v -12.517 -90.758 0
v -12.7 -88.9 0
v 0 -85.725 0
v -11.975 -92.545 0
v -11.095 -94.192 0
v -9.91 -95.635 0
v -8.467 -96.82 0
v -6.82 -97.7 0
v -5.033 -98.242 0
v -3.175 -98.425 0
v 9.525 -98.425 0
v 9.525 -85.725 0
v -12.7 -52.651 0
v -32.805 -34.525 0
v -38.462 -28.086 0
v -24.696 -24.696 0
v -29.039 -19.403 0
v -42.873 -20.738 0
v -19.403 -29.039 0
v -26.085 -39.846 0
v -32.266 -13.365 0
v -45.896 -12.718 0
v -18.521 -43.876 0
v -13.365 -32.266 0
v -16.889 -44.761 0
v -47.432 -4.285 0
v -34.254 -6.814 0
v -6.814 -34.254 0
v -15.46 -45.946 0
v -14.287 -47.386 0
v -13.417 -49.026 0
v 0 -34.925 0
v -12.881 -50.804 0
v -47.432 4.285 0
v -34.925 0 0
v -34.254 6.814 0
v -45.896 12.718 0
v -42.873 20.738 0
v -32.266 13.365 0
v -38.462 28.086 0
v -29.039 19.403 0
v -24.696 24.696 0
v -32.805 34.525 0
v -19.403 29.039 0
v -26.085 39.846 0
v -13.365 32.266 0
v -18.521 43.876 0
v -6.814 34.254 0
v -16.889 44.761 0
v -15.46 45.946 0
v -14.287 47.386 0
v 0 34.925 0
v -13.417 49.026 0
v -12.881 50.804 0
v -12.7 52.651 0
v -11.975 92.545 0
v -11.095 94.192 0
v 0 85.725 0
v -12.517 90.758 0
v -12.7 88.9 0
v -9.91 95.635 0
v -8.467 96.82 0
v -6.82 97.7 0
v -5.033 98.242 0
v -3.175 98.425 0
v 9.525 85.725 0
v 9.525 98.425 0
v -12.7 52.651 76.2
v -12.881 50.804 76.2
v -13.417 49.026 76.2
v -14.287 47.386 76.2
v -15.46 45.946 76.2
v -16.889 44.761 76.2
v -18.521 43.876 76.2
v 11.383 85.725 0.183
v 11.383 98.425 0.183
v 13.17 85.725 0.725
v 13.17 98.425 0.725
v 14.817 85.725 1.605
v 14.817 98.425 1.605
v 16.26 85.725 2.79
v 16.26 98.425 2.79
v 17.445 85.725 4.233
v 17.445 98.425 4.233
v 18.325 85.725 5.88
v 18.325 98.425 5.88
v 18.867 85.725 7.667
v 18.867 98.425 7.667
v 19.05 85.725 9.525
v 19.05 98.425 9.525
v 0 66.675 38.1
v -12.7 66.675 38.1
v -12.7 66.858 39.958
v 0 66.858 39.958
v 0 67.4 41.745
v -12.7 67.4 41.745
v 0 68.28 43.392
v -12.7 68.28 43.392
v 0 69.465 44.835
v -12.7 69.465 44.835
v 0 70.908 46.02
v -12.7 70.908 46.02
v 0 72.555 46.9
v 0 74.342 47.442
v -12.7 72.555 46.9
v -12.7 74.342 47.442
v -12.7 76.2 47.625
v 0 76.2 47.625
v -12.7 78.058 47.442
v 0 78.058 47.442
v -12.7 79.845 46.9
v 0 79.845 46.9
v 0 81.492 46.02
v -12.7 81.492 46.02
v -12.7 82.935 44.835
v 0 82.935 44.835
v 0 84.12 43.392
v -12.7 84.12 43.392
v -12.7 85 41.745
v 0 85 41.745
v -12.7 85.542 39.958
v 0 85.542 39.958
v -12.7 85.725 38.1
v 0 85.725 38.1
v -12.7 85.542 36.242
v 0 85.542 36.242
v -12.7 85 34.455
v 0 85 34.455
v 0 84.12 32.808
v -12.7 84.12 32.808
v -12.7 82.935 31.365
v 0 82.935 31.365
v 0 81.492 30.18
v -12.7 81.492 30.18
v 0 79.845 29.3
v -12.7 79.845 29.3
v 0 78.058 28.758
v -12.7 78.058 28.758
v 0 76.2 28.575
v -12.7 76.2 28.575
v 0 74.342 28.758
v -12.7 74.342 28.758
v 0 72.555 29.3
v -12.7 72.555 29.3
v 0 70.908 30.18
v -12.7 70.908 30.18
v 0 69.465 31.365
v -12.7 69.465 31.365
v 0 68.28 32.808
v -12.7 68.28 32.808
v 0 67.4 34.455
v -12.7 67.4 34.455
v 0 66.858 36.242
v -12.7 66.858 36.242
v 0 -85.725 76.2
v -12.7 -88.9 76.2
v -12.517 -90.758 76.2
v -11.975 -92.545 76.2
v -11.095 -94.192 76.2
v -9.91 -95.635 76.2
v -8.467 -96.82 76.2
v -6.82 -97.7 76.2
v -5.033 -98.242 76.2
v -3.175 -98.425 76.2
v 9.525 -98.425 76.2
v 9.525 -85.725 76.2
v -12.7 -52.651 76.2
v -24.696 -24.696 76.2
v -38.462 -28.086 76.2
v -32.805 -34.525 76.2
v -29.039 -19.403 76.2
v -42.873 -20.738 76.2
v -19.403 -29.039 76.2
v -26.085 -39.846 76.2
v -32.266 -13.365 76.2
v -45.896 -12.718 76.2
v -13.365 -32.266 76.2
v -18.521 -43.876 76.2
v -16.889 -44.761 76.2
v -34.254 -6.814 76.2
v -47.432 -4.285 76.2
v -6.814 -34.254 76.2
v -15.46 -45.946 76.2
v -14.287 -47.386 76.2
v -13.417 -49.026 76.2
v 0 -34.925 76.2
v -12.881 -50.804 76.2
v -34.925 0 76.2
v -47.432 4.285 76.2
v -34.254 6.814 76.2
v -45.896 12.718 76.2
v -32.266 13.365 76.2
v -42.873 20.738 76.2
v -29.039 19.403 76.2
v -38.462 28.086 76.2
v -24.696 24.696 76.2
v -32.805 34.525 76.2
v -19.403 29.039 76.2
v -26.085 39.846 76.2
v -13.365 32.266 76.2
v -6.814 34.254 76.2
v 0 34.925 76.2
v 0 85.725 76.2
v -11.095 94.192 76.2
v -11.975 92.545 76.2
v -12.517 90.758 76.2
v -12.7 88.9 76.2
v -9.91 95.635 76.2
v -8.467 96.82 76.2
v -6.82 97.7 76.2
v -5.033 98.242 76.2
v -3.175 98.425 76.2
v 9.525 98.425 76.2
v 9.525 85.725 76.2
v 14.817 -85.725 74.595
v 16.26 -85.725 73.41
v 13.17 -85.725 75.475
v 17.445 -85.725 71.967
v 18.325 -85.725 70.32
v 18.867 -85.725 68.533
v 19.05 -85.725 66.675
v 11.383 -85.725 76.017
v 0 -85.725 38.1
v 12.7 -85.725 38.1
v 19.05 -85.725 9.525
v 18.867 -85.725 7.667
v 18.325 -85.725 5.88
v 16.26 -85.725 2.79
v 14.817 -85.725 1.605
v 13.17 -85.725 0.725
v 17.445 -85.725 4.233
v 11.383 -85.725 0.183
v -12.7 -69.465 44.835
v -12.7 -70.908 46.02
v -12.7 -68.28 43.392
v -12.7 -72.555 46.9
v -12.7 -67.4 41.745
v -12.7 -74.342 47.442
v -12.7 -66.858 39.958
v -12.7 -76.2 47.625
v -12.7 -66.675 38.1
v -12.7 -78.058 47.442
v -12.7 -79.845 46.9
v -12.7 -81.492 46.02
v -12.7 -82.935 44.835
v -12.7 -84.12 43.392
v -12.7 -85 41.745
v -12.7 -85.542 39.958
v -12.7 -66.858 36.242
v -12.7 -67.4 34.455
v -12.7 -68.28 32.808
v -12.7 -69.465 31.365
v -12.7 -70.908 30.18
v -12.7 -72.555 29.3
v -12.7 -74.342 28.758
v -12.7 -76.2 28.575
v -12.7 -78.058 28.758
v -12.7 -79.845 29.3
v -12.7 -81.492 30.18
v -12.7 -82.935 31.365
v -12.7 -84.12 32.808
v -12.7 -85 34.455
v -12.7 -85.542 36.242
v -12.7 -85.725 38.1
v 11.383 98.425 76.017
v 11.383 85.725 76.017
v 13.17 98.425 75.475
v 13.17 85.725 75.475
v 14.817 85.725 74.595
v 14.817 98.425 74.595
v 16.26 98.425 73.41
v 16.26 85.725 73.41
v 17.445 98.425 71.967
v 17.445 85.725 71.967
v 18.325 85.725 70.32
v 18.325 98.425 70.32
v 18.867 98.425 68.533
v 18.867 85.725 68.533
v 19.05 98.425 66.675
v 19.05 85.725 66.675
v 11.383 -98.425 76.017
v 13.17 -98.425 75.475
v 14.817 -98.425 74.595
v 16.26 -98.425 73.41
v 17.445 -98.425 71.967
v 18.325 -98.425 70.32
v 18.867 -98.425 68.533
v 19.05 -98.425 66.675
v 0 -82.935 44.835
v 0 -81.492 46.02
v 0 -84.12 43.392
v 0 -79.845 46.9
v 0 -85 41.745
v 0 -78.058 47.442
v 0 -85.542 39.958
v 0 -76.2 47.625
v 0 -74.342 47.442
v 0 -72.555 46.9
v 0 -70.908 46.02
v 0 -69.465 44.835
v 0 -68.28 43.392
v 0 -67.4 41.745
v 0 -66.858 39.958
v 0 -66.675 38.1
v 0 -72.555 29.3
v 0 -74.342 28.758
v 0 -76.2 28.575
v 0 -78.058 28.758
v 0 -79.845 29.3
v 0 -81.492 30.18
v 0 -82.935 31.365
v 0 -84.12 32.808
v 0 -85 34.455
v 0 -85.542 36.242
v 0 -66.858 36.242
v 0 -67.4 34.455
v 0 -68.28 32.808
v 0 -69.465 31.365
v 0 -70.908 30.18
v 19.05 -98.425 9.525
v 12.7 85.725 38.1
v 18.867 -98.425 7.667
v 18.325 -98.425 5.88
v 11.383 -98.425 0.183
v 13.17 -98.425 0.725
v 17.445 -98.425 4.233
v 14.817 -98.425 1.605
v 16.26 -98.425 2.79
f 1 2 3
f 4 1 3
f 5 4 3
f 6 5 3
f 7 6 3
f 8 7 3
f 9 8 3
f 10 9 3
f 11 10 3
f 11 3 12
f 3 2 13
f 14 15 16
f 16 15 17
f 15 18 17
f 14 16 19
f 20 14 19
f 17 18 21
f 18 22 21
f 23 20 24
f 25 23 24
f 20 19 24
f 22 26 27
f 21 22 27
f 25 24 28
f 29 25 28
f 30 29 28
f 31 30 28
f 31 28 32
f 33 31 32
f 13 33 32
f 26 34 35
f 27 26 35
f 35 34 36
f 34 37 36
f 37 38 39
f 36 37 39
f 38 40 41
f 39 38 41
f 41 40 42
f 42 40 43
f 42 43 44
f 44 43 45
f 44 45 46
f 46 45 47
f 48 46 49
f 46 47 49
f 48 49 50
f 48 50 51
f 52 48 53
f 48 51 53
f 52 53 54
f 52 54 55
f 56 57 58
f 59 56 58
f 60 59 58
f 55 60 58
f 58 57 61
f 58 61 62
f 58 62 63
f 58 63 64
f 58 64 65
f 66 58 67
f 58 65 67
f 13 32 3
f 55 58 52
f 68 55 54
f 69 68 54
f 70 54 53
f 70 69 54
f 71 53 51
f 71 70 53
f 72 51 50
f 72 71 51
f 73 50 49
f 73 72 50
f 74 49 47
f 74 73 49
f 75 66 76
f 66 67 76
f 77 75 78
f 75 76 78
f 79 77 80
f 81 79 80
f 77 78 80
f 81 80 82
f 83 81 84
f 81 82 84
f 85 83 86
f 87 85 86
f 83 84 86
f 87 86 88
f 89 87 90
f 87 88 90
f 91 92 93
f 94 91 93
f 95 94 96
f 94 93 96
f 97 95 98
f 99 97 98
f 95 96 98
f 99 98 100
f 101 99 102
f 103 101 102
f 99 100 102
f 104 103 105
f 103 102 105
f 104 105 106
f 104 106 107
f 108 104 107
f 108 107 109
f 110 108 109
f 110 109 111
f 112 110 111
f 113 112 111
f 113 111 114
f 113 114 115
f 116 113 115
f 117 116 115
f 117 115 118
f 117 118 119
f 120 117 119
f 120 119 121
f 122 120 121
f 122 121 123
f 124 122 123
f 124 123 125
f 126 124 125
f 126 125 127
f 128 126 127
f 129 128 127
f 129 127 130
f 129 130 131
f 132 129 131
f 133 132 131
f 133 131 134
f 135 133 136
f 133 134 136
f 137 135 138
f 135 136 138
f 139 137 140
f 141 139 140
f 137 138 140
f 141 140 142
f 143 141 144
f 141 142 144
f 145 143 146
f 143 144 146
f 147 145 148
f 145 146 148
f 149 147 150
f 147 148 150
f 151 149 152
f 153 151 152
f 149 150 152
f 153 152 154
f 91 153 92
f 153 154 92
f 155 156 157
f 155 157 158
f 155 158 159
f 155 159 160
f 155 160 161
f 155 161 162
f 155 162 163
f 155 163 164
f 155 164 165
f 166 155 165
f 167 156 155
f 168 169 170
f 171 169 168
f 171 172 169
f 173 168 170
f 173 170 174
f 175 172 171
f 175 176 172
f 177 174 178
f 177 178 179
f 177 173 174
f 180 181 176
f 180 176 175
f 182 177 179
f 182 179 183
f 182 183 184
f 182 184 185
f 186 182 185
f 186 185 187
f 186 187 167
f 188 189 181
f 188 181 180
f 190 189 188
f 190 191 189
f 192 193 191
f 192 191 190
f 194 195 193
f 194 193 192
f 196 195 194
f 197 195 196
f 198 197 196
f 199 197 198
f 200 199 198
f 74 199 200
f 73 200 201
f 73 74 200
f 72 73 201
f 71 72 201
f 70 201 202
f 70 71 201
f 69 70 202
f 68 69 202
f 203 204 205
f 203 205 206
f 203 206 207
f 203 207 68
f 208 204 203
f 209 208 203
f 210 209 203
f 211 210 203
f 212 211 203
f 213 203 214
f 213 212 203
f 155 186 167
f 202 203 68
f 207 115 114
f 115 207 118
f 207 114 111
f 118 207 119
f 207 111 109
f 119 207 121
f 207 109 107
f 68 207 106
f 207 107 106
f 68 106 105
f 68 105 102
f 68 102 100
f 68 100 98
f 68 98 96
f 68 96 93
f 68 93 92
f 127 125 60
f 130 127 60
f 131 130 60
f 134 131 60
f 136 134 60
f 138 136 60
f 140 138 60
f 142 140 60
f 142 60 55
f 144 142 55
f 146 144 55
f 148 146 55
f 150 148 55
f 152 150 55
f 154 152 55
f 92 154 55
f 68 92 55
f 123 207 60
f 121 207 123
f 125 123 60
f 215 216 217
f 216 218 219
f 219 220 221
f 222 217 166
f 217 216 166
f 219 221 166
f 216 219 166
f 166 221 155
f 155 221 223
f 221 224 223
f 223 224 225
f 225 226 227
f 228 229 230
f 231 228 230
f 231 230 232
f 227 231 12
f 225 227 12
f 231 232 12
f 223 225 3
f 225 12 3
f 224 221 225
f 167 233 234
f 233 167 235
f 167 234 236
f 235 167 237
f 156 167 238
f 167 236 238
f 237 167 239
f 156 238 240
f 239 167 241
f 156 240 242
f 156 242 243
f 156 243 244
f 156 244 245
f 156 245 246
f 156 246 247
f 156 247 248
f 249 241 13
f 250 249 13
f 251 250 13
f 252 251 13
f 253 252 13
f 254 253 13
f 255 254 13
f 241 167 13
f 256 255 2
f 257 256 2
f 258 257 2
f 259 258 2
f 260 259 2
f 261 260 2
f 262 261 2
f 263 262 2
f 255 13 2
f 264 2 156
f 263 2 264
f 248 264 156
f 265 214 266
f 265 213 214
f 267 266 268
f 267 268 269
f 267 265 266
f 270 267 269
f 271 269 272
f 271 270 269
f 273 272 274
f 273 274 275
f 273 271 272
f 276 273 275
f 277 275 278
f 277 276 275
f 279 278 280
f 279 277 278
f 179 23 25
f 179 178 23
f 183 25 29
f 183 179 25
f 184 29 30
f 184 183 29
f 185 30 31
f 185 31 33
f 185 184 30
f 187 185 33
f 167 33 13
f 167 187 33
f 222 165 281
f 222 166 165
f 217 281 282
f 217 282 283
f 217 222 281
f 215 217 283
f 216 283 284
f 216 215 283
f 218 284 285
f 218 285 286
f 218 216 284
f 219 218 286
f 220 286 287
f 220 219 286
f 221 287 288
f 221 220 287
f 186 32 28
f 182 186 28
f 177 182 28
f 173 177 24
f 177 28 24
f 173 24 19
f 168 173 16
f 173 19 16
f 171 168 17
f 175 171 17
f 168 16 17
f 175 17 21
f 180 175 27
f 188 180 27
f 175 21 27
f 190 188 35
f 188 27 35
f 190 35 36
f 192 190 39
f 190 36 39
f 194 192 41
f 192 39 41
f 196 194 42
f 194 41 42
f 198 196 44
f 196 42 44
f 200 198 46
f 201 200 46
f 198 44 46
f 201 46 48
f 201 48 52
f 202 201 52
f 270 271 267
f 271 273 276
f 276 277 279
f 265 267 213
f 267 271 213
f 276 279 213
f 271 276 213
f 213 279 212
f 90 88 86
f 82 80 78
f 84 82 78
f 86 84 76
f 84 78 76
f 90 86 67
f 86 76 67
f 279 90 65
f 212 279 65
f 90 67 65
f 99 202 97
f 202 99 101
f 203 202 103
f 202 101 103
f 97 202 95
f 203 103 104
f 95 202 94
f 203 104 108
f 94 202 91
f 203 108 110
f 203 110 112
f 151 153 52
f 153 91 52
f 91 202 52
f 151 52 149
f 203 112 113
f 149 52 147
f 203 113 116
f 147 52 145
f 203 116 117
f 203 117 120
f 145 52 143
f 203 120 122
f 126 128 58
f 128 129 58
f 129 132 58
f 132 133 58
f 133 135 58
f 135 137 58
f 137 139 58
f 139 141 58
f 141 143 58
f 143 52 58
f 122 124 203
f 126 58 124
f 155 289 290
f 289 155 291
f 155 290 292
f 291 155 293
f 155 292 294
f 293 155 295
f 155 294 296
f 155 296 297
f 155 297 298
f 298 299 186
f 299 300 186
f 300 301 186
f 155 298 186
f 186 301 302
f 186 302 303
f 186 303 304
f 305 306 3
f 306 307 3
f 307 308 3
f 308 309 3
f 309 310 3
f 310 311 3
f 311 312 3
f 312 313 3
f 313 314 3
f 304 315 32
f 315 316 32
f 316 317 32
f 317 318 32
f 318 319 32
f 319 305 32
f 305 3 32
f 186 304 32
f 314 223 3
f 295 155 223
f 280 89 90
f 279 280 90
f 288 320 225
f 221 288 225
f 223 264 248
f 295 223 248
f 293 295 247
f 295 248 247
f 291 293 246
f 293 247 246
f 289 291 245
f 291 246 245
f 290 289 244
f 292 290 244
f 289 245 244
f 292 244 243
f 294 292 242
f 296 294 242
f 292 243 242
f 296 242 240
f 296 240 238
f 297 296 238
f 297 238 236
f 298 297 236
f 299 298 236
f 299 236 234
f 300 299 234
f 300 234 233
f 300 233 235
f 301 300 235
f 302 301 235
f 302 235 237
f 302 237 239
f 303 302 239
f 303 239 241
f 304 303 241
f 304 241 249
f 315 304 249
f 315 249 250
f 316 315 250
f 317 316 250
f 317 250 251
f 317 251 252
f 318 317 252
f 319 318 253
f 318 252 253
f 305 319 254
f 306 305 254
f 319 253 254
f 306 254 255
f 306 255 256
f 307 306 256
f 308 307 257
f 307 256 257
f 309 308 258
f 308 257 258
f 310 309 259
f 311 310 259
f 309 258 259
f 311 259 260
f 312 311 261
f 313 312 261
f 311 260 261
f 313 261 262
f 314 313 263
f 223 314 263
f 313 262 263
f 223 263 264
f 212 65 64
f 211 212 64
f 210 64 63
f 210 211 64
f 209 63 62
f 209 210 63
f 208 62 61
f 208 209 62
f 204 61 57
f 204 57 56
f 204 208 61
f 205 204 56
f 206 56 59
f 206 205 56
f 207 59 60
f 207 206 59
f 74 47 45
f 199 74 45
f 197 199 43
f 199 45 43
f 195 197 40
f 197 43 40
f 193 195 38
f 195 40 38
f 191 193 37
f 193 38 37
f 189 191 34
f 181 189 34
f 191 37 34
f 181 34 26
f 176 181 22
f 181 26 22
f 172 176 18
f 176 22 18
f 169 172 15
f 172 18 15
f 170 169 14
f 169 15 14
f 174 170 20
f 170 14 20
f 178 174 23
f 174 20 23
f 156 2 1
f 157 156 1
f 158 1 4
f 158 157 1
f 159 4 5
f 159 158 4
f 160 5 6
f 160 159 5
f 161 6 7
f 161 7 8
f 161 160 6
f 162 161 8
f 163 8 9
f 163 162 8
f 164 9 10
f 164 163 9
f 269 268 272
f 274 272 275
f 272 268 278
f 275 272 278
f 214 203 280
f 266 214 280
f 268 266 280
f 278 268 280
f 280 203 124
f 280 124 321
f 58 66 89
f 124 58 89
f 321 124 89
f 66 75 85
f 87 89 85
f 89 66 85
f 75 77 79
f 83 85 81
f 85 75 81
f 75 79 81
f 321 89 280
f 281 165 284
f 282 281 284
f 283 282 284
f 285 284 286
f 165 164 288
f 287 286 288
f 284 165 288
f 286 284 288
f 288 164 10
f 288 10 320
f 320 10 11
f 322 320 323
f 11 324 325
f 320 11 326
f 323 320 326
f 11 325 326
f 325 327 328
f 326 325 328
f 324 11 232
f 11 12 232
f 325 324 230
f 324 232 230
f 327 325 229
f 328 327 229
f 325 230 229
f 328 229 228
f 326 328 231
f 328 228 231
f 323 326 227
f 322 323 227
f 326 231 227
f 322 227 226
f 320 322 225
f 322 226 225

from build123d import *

# Parameters (mm, degrees)
F1_DEPTH = 76.2
F2_R     = 9.525
F3_DEPTH = 25.4
F4_R     = 9.525


with BuildPart() as f1:
    # F0 (on Top) → F1 (new body)
    with BuildSketch(Plane.XY):
        with BuildLine():
            ThreePointArc((0, -34.925), (-34.925, 0), (0, 34.925))
            Line((0, 34.925), (0, 47.625))
            Line((0, 47.625), (0, 56.876238))
            Line((0, 56.876238), (0, 85.725))
            Line((0, 85.725), (19.05, 85.725))
            Line((19.05, 85.725), (19.05, 98.425))
            Line((19.05, 98.425), (-12.7, 98.425))
            Line((-12.7, 98.425), (-12.7, 45.900443))
            ThreePointArc((-12.7, 45.900443), (-47.625, 0), (-12.7, -45.900443))
            Line((-12.7, -45.900443), (-12.7, -98.425))
            Line((-12.7, -98.425), (19.05, -98.425))
            Line((19.05, -98.425), (19.05, -85.725))
            Line((19.05, -85.725), (0, -85.725))
            Line((0, -85.725), (0, -47.625))
            Line((0, -47.625), (0, -34.925))
        make_face()
    extrude(amount=F1_DEPTH)

    # F2 (on face) → F3 (cut)
    with BuildSketch(Plane(origin=(-12.7, 0, 0), x_dir=(0, -1, 0), z_dir=(-1, 0, 0))):
        with Locations((-76.2, 38.1)):
            Circle(F2_R)
        with Locations((76.2, 38.1)):
            Circle(F2_R)
    extrude(amount=-F3_DEPTH, mode=Mode.SUBTRACT)

    # F4
    f4_edges = [f1.edges().sort_by_distance(p)[0] for p in [
        (-12.7, -45.900443, 38.1),
        (-12.7, 45.900443, 38.1),
        (-12.7, 98.425, 38.1),
        (-12.7, -98.425, 38.1),
        (19.05, -92.075, 0),
        (19.05, 92.075, 0),
        (19.05, 92.075, 76.2),
        (19.05, -92.075, 76.2),
    ]]
    fillet(f4_edges, radius=F4_R)


solid = f1.part
